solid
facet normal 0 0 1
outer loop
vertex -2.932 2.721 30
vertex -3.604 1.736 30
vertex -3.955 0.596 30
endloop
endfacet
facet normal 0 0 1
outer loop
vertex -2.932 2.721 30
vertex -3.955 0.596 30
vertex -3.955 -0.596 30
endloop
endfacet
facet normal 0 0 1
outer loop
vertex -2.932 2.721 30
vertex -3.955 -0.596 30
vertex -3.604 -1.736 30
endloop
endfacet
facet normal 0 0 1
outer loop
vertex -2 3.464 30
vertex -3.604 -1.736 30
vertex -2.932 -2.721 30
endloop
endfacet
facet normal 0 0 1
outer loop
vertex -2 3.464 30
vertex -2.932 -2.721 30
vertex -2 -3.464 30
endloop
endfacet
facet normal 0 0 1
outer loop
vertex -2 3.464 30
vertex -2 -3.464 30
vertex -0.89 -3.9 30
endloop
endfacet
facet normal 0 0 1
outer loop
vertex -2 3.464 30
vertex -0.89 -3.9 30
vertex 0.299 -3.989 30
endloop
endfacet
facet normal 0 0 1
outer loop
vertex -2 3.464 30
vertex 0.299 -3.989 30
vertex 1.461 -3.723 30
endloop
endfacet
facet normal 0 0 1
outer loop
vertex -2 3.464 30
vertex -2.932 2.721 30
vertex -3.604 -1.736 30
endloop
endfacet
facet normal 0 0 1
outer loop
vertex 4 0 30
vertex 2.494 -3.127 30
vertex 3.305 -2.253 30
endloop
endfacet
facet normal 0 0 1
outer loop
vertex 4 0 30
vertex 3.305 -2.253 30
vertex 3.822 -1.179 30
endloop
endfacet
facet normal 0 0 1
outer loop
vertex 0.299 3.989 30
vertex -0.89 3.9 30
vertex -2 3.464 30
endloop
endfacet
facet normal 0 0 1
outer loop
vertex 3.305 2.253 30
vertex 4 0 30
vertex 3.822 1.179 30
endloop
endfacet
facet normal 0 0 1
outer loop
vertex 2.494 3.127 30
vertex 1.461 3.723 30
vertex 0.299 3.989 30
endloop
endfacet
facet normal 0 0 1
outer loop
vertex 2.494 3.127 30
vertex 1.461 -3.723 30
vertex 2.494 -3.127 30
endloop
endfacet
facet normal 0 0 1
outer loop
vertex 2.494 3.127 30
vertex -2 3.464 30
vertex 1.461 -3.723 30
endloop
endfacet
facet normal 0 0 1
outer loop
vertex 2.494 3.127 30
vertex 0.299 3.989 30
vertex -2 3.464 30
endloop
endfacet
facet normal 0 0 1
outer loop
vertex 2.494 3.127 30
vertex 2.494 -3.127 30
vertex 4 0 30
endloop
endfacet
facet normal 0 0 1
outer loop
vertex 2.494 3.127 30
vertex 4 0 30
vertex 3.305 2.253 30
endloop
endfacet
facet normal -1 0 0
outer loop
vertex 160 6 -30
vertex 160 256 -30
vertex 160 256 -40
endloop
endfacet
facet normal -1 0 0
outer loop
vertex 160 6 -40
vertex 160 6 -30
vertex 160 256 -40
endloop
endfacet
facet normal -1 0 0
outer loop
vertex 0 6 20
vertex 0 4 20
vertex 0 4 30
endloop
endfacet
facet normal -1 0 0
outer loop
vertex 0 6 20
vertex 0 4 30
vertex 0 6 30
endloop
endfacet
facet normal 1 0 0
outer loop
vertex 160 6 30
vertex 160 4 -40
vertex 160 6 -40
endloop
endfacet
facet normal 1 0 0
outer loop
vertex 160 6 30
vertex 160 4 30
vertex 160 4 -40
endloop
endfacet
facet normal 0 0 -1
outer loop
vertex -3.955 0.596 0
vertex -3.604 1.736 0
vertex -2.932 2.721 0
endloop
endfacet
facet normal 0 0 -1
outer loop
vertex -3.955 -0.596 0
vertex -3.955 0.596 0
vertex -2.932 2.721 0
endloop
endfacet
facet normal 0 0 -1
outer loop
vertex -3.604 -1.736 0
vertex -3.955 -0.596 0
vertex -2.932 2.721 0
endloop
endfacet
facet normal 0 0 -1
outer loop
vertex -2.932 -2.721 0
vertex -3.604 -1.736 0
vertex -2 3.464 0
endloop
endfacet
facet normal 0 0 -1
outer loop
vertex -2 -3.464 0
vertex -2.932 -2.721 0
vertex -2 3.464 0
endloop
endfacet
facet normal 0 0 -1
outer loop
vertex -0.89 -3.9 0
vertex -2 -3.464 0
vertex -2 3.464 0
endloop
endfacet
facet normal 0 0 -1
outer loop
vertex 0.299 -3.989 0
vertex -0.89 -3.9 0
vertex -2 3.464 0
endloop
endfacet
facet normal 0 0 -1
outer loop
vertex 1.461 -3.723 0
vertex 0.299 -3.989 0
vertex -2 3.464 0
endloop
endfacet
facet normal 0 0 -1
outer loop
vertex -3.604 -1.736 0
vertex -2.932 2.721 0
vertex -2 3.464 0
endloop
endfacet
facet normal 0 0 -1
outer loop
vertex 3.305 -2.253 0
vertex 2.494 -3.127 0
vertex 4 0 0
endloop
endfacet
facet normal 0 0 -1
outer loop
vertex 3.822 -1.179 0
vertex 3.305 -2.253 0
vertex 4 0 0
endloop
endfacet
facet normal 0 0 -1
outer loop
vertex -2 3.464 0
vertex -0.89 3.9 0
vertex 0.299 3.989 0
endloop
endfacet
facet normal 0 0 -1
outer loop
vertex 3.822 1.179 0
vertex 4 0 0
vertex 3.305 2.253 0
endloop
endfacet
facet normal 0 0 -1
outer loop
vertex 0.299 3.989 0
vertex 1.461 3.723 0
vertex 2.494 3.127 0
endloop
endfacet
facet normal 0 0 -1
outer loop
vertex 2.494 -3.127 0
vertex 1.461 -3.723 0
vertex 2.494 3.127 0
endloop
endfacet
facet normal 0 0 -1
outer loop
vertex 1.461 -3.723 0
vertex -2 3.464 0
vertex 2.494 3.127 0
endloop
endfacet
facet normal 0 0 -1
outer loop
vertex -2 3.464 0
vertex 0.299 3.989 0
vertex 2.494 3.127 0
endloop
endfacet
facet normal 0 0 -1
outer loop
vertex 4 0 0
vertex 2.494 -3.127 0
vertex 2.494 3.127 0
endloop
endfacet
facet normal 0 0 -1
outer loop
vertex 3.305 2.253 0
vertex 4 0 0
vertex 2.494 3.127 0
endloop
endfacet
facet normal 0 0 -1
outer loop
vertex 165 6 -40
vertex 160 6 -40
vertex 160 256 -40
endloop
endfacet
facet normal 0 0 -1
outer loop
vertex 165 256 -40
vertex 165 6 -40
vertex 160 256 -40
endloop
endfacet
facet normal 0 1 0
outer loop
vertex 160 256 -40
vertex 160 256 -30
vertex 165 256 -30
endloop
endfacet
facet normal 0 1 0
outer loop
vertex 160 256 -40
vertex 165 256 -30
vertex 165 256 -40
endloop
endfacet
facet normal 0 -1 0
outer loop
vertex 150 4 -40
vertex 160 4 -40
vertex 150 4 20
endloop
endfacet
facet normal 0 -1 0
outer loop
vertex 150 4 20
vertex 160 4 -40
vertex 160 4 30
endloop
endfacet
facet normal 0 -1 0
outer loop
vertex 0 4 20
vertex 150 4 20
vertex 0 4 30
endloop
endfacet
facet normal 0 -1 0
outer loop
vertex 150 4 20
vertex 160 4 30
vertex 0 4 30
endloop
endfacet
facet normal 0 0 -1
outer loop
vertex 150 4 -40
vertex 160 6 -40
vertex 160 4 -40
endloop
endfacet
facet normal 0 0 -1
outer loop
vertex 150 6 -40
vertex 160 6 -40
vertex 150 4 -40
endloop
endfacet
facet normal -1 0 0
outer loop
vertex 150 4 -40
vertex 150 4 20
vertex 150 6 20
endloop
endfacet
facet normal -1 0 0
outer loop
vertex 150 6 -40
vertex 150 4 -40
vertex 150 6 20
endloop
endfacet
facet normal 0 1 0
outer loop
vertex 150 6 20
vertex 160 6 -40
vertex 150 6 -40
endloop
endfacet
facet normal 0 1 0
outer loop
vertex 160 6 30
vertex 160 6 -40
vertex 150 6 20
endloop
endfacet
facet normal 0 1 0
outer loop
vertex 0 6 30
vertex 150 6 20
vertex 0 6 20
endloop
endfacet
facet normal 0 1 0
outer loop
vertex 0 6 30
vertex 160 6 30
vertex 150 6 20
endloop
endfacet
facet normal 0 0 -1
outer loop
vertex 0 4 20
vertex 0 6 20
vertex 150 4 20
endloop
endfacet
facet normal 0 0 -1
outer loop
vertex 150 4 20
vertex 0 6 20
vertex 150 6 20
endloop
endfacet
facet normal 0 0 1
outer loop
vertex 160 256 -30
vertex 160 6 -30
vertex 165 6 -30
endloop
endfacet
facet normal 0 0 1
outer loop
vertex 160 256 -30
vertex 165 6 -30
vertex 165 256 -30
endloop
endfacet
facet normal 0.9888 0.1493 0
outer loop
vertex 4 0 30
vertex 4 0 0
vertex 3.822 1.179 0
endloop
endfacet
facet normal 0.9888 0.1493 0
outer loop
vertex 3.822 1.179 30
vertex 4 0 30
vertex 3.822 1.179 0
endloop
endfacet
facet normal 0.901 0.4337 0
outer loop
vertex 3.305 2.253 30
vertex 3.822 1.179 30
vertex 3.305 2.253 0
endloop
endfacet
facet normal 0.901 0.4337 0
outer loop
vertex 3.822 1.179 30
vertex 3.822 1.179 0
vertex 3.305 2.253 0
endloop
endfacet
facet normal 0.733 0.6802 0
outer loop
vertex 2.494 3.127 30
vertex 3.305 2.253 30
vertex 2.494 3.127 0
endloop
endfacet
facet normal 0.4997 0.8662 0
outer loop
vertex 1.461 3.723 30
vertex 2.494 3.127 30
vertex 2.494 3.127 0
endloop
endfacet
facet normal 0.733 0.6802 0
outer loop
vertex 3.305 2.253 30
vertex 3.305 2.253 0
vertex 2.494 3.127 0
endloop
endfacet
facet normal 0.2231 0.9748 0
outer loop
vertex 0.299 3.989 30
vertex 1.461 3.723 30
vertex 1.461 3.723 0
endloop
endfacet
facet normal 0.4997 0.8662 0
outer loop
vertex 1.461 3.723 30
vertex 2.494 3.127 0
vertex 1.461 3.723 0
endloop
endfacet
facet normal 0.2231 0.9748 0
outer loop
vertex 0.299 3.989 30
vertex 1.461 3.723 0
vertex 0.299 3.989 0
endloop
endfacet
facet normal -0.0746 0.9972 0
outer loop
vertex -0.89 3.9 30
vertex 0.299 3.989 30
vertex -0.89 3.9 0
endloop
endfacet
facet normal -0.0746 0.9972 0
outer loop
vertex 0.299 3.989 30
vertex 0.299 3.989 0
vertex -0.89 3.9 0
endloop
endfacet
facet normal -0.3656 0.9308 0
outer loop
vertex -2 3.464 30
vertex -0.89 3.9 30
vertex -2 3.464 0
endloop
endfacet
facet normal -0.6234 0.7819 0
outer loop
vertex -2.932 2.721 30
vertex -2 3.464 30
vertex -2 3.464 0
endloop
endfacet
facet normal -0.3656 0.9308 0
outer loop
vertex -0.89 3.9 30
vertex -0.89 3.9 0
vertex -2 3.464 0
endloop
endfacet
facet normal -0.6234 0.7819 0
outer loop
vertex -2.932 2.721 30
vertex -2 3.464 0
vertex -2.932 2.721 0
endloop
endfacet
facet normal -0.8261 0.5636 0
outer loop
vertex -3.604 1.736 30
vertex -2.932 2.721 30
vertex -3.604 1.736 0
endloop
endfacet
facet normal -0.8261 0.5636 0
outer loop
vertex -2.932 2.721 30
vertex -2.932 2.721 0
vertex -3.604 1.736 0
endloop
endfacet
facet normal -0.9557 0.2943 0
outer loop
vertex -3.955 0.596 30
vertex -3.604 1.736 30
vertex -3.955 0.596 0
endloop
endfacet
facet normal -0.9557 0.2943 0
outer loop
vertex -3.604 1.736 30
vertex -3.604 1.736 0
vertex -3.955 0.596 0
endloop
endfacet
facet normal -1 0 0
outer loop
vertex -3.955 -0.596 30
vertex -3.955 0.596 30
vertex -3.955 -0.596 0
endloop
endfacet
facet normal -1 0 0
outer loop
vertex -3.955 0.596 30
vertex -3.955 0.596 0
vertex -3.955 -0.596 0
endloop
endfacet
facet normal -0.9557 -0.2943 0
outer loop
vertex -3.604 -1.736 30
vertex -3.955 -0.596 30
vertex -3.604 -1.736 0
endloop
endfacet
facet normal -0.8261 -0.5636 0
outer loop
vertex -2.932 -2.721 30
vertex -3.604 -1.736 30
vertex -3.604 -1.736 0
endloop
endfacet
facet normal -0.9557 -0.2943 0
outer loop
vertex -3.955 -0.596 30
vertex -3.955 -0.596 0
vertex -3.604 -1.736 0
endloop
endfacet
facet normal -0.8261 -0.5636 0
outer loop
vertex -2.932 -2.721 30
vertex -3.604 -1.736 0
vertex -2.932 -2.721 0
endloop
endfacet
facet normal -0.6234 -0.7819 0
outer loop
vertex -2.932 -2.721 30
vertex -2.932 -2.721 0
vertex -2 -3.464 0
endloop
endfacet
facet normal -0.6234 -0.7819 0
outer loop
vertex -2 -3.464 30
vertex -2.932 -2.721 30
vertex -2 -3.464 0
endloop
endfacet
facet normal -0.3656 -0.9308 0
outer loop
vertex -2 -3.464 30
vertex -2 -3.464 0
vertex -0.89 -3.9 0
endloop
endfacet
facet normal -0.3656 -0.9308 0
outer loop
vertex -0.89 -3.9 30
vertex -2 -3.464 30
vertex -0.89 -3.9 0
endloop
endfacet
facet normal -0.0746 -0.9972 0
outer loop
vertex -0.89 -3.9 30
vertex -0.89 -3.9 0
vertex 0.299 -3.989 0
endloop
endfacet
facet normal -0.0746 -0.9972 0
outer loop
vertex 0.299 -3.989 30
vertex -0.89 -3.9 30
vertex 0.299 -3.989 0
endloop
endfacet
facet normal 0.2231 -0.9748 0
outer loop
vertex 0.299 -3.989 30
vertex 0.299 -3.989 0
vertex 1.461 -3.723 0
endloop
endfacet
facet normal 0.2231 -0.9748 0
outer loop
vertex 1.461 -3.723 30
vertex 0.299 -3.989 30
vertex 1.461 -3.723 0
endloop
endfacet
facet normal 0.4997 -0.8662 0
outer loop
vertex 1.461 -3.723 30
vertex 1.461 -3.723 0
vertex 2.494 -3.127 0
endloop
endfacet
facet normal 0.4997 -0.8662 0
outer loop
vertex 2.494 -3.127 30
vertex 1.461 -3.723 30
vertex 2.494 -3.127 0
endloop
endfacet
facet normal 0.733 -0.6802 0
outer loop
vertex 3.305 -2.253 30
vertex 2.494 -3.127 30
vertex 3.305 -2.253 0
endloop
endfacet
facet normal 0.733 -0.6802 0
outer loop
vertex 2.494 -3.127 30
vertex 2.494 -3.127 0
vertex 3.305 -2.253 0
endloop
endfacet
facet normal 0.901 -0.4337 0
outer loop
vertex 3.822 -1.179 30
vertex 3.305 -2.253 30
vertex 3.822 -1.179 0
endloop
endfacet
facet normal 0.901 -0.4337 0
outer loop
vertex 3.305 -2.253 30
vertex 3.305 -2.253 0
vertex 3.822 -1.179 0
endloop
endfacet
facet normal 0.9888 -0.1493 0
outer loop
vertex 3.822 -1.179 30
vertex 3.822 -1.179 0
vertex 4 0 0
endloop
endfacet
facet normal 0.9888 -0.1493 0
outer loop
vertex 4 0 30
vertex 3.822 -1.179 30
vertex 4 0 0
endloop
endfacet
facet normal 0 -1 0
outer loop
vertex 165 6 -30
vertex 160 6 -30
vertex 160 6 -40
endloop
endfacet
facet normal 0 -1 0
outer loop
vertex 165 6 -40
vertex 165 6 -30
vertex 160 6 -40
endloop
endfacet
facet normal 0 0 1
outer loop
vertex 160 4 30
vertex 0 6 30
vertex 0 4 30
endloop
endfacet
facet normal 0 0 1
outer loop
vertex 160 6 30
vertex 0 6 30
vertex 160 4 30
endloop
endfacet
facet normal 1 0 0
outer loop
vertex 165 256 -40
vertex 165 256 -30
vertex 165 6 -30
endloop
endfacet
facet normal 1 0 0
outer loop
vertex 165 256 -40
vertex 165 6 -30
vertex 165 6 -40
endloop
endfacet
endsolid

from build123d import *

# Parameters (mm, degrees)
SKETCH1_R           = 4
BOSS_EXTRUDE1_DEPTH = 30
SKETCH2_W           = 160
SKETCH2_H           = 2
BOSS_EXTRUDE2_DEPTH = 10
SKETCH3_W           = 10
SKETCH3_H           = 2
BOSS_EXTRUDE3_DEPTH = 60
SKETCH5_W           = 10
SKETCH5_H           = 250
BOSS_EXTRUDE5_DEPTH = 5


with BuildPart() as part:
    # Sketch1 → Boss-Extrude1 (new body)
    with BuildSketch(Plane.XY):
        Circle(SKETCH1_R)
    extrude(amount=BOSS_EXTRUDE1_DEPTH)


with BuildPart() as body_2:
    # Sketch2 → Boss-Extrude2 (new body)
    with BuildSketch(Plane.XY.offset(30)):
        with Locations((80, 5)):
            Rectangle(SKETCH2_W, SKETCH2_H)
    extrude(amount=-BOSS_EXTRUDE2_DEPTH)

    # Sketch3 → Boss-Extrude3 (add)
    with BuildSketch(Plane(origin=(0, 0, 20), x_dir=(-1, 0, 0), z_dir=(0, 0, -1))):
        with Locations((-155, 5)):
            Rectangle(SKETCH3_W, SKETCH3_H)
    extrude(amount=BOSS_EXTRUDE3_DEPTH)


with BuildPart() as body_3:
    # Sketch5 → Boss-Extrude5 (new body)
    with BuildSketch(Plane(origin=(160, 0, 0), x_dir=(0, 0, -1), z_dir=(1, 0, 0))):
        with Locations((35, 131)):
            Rectangle(SKETCH5_W, SKETCH5_H)
    extrude(amount=BOSS_EXTRUDE5_DEPTH)


solid = Compound([part.part, body_2.part, body_3.part])
